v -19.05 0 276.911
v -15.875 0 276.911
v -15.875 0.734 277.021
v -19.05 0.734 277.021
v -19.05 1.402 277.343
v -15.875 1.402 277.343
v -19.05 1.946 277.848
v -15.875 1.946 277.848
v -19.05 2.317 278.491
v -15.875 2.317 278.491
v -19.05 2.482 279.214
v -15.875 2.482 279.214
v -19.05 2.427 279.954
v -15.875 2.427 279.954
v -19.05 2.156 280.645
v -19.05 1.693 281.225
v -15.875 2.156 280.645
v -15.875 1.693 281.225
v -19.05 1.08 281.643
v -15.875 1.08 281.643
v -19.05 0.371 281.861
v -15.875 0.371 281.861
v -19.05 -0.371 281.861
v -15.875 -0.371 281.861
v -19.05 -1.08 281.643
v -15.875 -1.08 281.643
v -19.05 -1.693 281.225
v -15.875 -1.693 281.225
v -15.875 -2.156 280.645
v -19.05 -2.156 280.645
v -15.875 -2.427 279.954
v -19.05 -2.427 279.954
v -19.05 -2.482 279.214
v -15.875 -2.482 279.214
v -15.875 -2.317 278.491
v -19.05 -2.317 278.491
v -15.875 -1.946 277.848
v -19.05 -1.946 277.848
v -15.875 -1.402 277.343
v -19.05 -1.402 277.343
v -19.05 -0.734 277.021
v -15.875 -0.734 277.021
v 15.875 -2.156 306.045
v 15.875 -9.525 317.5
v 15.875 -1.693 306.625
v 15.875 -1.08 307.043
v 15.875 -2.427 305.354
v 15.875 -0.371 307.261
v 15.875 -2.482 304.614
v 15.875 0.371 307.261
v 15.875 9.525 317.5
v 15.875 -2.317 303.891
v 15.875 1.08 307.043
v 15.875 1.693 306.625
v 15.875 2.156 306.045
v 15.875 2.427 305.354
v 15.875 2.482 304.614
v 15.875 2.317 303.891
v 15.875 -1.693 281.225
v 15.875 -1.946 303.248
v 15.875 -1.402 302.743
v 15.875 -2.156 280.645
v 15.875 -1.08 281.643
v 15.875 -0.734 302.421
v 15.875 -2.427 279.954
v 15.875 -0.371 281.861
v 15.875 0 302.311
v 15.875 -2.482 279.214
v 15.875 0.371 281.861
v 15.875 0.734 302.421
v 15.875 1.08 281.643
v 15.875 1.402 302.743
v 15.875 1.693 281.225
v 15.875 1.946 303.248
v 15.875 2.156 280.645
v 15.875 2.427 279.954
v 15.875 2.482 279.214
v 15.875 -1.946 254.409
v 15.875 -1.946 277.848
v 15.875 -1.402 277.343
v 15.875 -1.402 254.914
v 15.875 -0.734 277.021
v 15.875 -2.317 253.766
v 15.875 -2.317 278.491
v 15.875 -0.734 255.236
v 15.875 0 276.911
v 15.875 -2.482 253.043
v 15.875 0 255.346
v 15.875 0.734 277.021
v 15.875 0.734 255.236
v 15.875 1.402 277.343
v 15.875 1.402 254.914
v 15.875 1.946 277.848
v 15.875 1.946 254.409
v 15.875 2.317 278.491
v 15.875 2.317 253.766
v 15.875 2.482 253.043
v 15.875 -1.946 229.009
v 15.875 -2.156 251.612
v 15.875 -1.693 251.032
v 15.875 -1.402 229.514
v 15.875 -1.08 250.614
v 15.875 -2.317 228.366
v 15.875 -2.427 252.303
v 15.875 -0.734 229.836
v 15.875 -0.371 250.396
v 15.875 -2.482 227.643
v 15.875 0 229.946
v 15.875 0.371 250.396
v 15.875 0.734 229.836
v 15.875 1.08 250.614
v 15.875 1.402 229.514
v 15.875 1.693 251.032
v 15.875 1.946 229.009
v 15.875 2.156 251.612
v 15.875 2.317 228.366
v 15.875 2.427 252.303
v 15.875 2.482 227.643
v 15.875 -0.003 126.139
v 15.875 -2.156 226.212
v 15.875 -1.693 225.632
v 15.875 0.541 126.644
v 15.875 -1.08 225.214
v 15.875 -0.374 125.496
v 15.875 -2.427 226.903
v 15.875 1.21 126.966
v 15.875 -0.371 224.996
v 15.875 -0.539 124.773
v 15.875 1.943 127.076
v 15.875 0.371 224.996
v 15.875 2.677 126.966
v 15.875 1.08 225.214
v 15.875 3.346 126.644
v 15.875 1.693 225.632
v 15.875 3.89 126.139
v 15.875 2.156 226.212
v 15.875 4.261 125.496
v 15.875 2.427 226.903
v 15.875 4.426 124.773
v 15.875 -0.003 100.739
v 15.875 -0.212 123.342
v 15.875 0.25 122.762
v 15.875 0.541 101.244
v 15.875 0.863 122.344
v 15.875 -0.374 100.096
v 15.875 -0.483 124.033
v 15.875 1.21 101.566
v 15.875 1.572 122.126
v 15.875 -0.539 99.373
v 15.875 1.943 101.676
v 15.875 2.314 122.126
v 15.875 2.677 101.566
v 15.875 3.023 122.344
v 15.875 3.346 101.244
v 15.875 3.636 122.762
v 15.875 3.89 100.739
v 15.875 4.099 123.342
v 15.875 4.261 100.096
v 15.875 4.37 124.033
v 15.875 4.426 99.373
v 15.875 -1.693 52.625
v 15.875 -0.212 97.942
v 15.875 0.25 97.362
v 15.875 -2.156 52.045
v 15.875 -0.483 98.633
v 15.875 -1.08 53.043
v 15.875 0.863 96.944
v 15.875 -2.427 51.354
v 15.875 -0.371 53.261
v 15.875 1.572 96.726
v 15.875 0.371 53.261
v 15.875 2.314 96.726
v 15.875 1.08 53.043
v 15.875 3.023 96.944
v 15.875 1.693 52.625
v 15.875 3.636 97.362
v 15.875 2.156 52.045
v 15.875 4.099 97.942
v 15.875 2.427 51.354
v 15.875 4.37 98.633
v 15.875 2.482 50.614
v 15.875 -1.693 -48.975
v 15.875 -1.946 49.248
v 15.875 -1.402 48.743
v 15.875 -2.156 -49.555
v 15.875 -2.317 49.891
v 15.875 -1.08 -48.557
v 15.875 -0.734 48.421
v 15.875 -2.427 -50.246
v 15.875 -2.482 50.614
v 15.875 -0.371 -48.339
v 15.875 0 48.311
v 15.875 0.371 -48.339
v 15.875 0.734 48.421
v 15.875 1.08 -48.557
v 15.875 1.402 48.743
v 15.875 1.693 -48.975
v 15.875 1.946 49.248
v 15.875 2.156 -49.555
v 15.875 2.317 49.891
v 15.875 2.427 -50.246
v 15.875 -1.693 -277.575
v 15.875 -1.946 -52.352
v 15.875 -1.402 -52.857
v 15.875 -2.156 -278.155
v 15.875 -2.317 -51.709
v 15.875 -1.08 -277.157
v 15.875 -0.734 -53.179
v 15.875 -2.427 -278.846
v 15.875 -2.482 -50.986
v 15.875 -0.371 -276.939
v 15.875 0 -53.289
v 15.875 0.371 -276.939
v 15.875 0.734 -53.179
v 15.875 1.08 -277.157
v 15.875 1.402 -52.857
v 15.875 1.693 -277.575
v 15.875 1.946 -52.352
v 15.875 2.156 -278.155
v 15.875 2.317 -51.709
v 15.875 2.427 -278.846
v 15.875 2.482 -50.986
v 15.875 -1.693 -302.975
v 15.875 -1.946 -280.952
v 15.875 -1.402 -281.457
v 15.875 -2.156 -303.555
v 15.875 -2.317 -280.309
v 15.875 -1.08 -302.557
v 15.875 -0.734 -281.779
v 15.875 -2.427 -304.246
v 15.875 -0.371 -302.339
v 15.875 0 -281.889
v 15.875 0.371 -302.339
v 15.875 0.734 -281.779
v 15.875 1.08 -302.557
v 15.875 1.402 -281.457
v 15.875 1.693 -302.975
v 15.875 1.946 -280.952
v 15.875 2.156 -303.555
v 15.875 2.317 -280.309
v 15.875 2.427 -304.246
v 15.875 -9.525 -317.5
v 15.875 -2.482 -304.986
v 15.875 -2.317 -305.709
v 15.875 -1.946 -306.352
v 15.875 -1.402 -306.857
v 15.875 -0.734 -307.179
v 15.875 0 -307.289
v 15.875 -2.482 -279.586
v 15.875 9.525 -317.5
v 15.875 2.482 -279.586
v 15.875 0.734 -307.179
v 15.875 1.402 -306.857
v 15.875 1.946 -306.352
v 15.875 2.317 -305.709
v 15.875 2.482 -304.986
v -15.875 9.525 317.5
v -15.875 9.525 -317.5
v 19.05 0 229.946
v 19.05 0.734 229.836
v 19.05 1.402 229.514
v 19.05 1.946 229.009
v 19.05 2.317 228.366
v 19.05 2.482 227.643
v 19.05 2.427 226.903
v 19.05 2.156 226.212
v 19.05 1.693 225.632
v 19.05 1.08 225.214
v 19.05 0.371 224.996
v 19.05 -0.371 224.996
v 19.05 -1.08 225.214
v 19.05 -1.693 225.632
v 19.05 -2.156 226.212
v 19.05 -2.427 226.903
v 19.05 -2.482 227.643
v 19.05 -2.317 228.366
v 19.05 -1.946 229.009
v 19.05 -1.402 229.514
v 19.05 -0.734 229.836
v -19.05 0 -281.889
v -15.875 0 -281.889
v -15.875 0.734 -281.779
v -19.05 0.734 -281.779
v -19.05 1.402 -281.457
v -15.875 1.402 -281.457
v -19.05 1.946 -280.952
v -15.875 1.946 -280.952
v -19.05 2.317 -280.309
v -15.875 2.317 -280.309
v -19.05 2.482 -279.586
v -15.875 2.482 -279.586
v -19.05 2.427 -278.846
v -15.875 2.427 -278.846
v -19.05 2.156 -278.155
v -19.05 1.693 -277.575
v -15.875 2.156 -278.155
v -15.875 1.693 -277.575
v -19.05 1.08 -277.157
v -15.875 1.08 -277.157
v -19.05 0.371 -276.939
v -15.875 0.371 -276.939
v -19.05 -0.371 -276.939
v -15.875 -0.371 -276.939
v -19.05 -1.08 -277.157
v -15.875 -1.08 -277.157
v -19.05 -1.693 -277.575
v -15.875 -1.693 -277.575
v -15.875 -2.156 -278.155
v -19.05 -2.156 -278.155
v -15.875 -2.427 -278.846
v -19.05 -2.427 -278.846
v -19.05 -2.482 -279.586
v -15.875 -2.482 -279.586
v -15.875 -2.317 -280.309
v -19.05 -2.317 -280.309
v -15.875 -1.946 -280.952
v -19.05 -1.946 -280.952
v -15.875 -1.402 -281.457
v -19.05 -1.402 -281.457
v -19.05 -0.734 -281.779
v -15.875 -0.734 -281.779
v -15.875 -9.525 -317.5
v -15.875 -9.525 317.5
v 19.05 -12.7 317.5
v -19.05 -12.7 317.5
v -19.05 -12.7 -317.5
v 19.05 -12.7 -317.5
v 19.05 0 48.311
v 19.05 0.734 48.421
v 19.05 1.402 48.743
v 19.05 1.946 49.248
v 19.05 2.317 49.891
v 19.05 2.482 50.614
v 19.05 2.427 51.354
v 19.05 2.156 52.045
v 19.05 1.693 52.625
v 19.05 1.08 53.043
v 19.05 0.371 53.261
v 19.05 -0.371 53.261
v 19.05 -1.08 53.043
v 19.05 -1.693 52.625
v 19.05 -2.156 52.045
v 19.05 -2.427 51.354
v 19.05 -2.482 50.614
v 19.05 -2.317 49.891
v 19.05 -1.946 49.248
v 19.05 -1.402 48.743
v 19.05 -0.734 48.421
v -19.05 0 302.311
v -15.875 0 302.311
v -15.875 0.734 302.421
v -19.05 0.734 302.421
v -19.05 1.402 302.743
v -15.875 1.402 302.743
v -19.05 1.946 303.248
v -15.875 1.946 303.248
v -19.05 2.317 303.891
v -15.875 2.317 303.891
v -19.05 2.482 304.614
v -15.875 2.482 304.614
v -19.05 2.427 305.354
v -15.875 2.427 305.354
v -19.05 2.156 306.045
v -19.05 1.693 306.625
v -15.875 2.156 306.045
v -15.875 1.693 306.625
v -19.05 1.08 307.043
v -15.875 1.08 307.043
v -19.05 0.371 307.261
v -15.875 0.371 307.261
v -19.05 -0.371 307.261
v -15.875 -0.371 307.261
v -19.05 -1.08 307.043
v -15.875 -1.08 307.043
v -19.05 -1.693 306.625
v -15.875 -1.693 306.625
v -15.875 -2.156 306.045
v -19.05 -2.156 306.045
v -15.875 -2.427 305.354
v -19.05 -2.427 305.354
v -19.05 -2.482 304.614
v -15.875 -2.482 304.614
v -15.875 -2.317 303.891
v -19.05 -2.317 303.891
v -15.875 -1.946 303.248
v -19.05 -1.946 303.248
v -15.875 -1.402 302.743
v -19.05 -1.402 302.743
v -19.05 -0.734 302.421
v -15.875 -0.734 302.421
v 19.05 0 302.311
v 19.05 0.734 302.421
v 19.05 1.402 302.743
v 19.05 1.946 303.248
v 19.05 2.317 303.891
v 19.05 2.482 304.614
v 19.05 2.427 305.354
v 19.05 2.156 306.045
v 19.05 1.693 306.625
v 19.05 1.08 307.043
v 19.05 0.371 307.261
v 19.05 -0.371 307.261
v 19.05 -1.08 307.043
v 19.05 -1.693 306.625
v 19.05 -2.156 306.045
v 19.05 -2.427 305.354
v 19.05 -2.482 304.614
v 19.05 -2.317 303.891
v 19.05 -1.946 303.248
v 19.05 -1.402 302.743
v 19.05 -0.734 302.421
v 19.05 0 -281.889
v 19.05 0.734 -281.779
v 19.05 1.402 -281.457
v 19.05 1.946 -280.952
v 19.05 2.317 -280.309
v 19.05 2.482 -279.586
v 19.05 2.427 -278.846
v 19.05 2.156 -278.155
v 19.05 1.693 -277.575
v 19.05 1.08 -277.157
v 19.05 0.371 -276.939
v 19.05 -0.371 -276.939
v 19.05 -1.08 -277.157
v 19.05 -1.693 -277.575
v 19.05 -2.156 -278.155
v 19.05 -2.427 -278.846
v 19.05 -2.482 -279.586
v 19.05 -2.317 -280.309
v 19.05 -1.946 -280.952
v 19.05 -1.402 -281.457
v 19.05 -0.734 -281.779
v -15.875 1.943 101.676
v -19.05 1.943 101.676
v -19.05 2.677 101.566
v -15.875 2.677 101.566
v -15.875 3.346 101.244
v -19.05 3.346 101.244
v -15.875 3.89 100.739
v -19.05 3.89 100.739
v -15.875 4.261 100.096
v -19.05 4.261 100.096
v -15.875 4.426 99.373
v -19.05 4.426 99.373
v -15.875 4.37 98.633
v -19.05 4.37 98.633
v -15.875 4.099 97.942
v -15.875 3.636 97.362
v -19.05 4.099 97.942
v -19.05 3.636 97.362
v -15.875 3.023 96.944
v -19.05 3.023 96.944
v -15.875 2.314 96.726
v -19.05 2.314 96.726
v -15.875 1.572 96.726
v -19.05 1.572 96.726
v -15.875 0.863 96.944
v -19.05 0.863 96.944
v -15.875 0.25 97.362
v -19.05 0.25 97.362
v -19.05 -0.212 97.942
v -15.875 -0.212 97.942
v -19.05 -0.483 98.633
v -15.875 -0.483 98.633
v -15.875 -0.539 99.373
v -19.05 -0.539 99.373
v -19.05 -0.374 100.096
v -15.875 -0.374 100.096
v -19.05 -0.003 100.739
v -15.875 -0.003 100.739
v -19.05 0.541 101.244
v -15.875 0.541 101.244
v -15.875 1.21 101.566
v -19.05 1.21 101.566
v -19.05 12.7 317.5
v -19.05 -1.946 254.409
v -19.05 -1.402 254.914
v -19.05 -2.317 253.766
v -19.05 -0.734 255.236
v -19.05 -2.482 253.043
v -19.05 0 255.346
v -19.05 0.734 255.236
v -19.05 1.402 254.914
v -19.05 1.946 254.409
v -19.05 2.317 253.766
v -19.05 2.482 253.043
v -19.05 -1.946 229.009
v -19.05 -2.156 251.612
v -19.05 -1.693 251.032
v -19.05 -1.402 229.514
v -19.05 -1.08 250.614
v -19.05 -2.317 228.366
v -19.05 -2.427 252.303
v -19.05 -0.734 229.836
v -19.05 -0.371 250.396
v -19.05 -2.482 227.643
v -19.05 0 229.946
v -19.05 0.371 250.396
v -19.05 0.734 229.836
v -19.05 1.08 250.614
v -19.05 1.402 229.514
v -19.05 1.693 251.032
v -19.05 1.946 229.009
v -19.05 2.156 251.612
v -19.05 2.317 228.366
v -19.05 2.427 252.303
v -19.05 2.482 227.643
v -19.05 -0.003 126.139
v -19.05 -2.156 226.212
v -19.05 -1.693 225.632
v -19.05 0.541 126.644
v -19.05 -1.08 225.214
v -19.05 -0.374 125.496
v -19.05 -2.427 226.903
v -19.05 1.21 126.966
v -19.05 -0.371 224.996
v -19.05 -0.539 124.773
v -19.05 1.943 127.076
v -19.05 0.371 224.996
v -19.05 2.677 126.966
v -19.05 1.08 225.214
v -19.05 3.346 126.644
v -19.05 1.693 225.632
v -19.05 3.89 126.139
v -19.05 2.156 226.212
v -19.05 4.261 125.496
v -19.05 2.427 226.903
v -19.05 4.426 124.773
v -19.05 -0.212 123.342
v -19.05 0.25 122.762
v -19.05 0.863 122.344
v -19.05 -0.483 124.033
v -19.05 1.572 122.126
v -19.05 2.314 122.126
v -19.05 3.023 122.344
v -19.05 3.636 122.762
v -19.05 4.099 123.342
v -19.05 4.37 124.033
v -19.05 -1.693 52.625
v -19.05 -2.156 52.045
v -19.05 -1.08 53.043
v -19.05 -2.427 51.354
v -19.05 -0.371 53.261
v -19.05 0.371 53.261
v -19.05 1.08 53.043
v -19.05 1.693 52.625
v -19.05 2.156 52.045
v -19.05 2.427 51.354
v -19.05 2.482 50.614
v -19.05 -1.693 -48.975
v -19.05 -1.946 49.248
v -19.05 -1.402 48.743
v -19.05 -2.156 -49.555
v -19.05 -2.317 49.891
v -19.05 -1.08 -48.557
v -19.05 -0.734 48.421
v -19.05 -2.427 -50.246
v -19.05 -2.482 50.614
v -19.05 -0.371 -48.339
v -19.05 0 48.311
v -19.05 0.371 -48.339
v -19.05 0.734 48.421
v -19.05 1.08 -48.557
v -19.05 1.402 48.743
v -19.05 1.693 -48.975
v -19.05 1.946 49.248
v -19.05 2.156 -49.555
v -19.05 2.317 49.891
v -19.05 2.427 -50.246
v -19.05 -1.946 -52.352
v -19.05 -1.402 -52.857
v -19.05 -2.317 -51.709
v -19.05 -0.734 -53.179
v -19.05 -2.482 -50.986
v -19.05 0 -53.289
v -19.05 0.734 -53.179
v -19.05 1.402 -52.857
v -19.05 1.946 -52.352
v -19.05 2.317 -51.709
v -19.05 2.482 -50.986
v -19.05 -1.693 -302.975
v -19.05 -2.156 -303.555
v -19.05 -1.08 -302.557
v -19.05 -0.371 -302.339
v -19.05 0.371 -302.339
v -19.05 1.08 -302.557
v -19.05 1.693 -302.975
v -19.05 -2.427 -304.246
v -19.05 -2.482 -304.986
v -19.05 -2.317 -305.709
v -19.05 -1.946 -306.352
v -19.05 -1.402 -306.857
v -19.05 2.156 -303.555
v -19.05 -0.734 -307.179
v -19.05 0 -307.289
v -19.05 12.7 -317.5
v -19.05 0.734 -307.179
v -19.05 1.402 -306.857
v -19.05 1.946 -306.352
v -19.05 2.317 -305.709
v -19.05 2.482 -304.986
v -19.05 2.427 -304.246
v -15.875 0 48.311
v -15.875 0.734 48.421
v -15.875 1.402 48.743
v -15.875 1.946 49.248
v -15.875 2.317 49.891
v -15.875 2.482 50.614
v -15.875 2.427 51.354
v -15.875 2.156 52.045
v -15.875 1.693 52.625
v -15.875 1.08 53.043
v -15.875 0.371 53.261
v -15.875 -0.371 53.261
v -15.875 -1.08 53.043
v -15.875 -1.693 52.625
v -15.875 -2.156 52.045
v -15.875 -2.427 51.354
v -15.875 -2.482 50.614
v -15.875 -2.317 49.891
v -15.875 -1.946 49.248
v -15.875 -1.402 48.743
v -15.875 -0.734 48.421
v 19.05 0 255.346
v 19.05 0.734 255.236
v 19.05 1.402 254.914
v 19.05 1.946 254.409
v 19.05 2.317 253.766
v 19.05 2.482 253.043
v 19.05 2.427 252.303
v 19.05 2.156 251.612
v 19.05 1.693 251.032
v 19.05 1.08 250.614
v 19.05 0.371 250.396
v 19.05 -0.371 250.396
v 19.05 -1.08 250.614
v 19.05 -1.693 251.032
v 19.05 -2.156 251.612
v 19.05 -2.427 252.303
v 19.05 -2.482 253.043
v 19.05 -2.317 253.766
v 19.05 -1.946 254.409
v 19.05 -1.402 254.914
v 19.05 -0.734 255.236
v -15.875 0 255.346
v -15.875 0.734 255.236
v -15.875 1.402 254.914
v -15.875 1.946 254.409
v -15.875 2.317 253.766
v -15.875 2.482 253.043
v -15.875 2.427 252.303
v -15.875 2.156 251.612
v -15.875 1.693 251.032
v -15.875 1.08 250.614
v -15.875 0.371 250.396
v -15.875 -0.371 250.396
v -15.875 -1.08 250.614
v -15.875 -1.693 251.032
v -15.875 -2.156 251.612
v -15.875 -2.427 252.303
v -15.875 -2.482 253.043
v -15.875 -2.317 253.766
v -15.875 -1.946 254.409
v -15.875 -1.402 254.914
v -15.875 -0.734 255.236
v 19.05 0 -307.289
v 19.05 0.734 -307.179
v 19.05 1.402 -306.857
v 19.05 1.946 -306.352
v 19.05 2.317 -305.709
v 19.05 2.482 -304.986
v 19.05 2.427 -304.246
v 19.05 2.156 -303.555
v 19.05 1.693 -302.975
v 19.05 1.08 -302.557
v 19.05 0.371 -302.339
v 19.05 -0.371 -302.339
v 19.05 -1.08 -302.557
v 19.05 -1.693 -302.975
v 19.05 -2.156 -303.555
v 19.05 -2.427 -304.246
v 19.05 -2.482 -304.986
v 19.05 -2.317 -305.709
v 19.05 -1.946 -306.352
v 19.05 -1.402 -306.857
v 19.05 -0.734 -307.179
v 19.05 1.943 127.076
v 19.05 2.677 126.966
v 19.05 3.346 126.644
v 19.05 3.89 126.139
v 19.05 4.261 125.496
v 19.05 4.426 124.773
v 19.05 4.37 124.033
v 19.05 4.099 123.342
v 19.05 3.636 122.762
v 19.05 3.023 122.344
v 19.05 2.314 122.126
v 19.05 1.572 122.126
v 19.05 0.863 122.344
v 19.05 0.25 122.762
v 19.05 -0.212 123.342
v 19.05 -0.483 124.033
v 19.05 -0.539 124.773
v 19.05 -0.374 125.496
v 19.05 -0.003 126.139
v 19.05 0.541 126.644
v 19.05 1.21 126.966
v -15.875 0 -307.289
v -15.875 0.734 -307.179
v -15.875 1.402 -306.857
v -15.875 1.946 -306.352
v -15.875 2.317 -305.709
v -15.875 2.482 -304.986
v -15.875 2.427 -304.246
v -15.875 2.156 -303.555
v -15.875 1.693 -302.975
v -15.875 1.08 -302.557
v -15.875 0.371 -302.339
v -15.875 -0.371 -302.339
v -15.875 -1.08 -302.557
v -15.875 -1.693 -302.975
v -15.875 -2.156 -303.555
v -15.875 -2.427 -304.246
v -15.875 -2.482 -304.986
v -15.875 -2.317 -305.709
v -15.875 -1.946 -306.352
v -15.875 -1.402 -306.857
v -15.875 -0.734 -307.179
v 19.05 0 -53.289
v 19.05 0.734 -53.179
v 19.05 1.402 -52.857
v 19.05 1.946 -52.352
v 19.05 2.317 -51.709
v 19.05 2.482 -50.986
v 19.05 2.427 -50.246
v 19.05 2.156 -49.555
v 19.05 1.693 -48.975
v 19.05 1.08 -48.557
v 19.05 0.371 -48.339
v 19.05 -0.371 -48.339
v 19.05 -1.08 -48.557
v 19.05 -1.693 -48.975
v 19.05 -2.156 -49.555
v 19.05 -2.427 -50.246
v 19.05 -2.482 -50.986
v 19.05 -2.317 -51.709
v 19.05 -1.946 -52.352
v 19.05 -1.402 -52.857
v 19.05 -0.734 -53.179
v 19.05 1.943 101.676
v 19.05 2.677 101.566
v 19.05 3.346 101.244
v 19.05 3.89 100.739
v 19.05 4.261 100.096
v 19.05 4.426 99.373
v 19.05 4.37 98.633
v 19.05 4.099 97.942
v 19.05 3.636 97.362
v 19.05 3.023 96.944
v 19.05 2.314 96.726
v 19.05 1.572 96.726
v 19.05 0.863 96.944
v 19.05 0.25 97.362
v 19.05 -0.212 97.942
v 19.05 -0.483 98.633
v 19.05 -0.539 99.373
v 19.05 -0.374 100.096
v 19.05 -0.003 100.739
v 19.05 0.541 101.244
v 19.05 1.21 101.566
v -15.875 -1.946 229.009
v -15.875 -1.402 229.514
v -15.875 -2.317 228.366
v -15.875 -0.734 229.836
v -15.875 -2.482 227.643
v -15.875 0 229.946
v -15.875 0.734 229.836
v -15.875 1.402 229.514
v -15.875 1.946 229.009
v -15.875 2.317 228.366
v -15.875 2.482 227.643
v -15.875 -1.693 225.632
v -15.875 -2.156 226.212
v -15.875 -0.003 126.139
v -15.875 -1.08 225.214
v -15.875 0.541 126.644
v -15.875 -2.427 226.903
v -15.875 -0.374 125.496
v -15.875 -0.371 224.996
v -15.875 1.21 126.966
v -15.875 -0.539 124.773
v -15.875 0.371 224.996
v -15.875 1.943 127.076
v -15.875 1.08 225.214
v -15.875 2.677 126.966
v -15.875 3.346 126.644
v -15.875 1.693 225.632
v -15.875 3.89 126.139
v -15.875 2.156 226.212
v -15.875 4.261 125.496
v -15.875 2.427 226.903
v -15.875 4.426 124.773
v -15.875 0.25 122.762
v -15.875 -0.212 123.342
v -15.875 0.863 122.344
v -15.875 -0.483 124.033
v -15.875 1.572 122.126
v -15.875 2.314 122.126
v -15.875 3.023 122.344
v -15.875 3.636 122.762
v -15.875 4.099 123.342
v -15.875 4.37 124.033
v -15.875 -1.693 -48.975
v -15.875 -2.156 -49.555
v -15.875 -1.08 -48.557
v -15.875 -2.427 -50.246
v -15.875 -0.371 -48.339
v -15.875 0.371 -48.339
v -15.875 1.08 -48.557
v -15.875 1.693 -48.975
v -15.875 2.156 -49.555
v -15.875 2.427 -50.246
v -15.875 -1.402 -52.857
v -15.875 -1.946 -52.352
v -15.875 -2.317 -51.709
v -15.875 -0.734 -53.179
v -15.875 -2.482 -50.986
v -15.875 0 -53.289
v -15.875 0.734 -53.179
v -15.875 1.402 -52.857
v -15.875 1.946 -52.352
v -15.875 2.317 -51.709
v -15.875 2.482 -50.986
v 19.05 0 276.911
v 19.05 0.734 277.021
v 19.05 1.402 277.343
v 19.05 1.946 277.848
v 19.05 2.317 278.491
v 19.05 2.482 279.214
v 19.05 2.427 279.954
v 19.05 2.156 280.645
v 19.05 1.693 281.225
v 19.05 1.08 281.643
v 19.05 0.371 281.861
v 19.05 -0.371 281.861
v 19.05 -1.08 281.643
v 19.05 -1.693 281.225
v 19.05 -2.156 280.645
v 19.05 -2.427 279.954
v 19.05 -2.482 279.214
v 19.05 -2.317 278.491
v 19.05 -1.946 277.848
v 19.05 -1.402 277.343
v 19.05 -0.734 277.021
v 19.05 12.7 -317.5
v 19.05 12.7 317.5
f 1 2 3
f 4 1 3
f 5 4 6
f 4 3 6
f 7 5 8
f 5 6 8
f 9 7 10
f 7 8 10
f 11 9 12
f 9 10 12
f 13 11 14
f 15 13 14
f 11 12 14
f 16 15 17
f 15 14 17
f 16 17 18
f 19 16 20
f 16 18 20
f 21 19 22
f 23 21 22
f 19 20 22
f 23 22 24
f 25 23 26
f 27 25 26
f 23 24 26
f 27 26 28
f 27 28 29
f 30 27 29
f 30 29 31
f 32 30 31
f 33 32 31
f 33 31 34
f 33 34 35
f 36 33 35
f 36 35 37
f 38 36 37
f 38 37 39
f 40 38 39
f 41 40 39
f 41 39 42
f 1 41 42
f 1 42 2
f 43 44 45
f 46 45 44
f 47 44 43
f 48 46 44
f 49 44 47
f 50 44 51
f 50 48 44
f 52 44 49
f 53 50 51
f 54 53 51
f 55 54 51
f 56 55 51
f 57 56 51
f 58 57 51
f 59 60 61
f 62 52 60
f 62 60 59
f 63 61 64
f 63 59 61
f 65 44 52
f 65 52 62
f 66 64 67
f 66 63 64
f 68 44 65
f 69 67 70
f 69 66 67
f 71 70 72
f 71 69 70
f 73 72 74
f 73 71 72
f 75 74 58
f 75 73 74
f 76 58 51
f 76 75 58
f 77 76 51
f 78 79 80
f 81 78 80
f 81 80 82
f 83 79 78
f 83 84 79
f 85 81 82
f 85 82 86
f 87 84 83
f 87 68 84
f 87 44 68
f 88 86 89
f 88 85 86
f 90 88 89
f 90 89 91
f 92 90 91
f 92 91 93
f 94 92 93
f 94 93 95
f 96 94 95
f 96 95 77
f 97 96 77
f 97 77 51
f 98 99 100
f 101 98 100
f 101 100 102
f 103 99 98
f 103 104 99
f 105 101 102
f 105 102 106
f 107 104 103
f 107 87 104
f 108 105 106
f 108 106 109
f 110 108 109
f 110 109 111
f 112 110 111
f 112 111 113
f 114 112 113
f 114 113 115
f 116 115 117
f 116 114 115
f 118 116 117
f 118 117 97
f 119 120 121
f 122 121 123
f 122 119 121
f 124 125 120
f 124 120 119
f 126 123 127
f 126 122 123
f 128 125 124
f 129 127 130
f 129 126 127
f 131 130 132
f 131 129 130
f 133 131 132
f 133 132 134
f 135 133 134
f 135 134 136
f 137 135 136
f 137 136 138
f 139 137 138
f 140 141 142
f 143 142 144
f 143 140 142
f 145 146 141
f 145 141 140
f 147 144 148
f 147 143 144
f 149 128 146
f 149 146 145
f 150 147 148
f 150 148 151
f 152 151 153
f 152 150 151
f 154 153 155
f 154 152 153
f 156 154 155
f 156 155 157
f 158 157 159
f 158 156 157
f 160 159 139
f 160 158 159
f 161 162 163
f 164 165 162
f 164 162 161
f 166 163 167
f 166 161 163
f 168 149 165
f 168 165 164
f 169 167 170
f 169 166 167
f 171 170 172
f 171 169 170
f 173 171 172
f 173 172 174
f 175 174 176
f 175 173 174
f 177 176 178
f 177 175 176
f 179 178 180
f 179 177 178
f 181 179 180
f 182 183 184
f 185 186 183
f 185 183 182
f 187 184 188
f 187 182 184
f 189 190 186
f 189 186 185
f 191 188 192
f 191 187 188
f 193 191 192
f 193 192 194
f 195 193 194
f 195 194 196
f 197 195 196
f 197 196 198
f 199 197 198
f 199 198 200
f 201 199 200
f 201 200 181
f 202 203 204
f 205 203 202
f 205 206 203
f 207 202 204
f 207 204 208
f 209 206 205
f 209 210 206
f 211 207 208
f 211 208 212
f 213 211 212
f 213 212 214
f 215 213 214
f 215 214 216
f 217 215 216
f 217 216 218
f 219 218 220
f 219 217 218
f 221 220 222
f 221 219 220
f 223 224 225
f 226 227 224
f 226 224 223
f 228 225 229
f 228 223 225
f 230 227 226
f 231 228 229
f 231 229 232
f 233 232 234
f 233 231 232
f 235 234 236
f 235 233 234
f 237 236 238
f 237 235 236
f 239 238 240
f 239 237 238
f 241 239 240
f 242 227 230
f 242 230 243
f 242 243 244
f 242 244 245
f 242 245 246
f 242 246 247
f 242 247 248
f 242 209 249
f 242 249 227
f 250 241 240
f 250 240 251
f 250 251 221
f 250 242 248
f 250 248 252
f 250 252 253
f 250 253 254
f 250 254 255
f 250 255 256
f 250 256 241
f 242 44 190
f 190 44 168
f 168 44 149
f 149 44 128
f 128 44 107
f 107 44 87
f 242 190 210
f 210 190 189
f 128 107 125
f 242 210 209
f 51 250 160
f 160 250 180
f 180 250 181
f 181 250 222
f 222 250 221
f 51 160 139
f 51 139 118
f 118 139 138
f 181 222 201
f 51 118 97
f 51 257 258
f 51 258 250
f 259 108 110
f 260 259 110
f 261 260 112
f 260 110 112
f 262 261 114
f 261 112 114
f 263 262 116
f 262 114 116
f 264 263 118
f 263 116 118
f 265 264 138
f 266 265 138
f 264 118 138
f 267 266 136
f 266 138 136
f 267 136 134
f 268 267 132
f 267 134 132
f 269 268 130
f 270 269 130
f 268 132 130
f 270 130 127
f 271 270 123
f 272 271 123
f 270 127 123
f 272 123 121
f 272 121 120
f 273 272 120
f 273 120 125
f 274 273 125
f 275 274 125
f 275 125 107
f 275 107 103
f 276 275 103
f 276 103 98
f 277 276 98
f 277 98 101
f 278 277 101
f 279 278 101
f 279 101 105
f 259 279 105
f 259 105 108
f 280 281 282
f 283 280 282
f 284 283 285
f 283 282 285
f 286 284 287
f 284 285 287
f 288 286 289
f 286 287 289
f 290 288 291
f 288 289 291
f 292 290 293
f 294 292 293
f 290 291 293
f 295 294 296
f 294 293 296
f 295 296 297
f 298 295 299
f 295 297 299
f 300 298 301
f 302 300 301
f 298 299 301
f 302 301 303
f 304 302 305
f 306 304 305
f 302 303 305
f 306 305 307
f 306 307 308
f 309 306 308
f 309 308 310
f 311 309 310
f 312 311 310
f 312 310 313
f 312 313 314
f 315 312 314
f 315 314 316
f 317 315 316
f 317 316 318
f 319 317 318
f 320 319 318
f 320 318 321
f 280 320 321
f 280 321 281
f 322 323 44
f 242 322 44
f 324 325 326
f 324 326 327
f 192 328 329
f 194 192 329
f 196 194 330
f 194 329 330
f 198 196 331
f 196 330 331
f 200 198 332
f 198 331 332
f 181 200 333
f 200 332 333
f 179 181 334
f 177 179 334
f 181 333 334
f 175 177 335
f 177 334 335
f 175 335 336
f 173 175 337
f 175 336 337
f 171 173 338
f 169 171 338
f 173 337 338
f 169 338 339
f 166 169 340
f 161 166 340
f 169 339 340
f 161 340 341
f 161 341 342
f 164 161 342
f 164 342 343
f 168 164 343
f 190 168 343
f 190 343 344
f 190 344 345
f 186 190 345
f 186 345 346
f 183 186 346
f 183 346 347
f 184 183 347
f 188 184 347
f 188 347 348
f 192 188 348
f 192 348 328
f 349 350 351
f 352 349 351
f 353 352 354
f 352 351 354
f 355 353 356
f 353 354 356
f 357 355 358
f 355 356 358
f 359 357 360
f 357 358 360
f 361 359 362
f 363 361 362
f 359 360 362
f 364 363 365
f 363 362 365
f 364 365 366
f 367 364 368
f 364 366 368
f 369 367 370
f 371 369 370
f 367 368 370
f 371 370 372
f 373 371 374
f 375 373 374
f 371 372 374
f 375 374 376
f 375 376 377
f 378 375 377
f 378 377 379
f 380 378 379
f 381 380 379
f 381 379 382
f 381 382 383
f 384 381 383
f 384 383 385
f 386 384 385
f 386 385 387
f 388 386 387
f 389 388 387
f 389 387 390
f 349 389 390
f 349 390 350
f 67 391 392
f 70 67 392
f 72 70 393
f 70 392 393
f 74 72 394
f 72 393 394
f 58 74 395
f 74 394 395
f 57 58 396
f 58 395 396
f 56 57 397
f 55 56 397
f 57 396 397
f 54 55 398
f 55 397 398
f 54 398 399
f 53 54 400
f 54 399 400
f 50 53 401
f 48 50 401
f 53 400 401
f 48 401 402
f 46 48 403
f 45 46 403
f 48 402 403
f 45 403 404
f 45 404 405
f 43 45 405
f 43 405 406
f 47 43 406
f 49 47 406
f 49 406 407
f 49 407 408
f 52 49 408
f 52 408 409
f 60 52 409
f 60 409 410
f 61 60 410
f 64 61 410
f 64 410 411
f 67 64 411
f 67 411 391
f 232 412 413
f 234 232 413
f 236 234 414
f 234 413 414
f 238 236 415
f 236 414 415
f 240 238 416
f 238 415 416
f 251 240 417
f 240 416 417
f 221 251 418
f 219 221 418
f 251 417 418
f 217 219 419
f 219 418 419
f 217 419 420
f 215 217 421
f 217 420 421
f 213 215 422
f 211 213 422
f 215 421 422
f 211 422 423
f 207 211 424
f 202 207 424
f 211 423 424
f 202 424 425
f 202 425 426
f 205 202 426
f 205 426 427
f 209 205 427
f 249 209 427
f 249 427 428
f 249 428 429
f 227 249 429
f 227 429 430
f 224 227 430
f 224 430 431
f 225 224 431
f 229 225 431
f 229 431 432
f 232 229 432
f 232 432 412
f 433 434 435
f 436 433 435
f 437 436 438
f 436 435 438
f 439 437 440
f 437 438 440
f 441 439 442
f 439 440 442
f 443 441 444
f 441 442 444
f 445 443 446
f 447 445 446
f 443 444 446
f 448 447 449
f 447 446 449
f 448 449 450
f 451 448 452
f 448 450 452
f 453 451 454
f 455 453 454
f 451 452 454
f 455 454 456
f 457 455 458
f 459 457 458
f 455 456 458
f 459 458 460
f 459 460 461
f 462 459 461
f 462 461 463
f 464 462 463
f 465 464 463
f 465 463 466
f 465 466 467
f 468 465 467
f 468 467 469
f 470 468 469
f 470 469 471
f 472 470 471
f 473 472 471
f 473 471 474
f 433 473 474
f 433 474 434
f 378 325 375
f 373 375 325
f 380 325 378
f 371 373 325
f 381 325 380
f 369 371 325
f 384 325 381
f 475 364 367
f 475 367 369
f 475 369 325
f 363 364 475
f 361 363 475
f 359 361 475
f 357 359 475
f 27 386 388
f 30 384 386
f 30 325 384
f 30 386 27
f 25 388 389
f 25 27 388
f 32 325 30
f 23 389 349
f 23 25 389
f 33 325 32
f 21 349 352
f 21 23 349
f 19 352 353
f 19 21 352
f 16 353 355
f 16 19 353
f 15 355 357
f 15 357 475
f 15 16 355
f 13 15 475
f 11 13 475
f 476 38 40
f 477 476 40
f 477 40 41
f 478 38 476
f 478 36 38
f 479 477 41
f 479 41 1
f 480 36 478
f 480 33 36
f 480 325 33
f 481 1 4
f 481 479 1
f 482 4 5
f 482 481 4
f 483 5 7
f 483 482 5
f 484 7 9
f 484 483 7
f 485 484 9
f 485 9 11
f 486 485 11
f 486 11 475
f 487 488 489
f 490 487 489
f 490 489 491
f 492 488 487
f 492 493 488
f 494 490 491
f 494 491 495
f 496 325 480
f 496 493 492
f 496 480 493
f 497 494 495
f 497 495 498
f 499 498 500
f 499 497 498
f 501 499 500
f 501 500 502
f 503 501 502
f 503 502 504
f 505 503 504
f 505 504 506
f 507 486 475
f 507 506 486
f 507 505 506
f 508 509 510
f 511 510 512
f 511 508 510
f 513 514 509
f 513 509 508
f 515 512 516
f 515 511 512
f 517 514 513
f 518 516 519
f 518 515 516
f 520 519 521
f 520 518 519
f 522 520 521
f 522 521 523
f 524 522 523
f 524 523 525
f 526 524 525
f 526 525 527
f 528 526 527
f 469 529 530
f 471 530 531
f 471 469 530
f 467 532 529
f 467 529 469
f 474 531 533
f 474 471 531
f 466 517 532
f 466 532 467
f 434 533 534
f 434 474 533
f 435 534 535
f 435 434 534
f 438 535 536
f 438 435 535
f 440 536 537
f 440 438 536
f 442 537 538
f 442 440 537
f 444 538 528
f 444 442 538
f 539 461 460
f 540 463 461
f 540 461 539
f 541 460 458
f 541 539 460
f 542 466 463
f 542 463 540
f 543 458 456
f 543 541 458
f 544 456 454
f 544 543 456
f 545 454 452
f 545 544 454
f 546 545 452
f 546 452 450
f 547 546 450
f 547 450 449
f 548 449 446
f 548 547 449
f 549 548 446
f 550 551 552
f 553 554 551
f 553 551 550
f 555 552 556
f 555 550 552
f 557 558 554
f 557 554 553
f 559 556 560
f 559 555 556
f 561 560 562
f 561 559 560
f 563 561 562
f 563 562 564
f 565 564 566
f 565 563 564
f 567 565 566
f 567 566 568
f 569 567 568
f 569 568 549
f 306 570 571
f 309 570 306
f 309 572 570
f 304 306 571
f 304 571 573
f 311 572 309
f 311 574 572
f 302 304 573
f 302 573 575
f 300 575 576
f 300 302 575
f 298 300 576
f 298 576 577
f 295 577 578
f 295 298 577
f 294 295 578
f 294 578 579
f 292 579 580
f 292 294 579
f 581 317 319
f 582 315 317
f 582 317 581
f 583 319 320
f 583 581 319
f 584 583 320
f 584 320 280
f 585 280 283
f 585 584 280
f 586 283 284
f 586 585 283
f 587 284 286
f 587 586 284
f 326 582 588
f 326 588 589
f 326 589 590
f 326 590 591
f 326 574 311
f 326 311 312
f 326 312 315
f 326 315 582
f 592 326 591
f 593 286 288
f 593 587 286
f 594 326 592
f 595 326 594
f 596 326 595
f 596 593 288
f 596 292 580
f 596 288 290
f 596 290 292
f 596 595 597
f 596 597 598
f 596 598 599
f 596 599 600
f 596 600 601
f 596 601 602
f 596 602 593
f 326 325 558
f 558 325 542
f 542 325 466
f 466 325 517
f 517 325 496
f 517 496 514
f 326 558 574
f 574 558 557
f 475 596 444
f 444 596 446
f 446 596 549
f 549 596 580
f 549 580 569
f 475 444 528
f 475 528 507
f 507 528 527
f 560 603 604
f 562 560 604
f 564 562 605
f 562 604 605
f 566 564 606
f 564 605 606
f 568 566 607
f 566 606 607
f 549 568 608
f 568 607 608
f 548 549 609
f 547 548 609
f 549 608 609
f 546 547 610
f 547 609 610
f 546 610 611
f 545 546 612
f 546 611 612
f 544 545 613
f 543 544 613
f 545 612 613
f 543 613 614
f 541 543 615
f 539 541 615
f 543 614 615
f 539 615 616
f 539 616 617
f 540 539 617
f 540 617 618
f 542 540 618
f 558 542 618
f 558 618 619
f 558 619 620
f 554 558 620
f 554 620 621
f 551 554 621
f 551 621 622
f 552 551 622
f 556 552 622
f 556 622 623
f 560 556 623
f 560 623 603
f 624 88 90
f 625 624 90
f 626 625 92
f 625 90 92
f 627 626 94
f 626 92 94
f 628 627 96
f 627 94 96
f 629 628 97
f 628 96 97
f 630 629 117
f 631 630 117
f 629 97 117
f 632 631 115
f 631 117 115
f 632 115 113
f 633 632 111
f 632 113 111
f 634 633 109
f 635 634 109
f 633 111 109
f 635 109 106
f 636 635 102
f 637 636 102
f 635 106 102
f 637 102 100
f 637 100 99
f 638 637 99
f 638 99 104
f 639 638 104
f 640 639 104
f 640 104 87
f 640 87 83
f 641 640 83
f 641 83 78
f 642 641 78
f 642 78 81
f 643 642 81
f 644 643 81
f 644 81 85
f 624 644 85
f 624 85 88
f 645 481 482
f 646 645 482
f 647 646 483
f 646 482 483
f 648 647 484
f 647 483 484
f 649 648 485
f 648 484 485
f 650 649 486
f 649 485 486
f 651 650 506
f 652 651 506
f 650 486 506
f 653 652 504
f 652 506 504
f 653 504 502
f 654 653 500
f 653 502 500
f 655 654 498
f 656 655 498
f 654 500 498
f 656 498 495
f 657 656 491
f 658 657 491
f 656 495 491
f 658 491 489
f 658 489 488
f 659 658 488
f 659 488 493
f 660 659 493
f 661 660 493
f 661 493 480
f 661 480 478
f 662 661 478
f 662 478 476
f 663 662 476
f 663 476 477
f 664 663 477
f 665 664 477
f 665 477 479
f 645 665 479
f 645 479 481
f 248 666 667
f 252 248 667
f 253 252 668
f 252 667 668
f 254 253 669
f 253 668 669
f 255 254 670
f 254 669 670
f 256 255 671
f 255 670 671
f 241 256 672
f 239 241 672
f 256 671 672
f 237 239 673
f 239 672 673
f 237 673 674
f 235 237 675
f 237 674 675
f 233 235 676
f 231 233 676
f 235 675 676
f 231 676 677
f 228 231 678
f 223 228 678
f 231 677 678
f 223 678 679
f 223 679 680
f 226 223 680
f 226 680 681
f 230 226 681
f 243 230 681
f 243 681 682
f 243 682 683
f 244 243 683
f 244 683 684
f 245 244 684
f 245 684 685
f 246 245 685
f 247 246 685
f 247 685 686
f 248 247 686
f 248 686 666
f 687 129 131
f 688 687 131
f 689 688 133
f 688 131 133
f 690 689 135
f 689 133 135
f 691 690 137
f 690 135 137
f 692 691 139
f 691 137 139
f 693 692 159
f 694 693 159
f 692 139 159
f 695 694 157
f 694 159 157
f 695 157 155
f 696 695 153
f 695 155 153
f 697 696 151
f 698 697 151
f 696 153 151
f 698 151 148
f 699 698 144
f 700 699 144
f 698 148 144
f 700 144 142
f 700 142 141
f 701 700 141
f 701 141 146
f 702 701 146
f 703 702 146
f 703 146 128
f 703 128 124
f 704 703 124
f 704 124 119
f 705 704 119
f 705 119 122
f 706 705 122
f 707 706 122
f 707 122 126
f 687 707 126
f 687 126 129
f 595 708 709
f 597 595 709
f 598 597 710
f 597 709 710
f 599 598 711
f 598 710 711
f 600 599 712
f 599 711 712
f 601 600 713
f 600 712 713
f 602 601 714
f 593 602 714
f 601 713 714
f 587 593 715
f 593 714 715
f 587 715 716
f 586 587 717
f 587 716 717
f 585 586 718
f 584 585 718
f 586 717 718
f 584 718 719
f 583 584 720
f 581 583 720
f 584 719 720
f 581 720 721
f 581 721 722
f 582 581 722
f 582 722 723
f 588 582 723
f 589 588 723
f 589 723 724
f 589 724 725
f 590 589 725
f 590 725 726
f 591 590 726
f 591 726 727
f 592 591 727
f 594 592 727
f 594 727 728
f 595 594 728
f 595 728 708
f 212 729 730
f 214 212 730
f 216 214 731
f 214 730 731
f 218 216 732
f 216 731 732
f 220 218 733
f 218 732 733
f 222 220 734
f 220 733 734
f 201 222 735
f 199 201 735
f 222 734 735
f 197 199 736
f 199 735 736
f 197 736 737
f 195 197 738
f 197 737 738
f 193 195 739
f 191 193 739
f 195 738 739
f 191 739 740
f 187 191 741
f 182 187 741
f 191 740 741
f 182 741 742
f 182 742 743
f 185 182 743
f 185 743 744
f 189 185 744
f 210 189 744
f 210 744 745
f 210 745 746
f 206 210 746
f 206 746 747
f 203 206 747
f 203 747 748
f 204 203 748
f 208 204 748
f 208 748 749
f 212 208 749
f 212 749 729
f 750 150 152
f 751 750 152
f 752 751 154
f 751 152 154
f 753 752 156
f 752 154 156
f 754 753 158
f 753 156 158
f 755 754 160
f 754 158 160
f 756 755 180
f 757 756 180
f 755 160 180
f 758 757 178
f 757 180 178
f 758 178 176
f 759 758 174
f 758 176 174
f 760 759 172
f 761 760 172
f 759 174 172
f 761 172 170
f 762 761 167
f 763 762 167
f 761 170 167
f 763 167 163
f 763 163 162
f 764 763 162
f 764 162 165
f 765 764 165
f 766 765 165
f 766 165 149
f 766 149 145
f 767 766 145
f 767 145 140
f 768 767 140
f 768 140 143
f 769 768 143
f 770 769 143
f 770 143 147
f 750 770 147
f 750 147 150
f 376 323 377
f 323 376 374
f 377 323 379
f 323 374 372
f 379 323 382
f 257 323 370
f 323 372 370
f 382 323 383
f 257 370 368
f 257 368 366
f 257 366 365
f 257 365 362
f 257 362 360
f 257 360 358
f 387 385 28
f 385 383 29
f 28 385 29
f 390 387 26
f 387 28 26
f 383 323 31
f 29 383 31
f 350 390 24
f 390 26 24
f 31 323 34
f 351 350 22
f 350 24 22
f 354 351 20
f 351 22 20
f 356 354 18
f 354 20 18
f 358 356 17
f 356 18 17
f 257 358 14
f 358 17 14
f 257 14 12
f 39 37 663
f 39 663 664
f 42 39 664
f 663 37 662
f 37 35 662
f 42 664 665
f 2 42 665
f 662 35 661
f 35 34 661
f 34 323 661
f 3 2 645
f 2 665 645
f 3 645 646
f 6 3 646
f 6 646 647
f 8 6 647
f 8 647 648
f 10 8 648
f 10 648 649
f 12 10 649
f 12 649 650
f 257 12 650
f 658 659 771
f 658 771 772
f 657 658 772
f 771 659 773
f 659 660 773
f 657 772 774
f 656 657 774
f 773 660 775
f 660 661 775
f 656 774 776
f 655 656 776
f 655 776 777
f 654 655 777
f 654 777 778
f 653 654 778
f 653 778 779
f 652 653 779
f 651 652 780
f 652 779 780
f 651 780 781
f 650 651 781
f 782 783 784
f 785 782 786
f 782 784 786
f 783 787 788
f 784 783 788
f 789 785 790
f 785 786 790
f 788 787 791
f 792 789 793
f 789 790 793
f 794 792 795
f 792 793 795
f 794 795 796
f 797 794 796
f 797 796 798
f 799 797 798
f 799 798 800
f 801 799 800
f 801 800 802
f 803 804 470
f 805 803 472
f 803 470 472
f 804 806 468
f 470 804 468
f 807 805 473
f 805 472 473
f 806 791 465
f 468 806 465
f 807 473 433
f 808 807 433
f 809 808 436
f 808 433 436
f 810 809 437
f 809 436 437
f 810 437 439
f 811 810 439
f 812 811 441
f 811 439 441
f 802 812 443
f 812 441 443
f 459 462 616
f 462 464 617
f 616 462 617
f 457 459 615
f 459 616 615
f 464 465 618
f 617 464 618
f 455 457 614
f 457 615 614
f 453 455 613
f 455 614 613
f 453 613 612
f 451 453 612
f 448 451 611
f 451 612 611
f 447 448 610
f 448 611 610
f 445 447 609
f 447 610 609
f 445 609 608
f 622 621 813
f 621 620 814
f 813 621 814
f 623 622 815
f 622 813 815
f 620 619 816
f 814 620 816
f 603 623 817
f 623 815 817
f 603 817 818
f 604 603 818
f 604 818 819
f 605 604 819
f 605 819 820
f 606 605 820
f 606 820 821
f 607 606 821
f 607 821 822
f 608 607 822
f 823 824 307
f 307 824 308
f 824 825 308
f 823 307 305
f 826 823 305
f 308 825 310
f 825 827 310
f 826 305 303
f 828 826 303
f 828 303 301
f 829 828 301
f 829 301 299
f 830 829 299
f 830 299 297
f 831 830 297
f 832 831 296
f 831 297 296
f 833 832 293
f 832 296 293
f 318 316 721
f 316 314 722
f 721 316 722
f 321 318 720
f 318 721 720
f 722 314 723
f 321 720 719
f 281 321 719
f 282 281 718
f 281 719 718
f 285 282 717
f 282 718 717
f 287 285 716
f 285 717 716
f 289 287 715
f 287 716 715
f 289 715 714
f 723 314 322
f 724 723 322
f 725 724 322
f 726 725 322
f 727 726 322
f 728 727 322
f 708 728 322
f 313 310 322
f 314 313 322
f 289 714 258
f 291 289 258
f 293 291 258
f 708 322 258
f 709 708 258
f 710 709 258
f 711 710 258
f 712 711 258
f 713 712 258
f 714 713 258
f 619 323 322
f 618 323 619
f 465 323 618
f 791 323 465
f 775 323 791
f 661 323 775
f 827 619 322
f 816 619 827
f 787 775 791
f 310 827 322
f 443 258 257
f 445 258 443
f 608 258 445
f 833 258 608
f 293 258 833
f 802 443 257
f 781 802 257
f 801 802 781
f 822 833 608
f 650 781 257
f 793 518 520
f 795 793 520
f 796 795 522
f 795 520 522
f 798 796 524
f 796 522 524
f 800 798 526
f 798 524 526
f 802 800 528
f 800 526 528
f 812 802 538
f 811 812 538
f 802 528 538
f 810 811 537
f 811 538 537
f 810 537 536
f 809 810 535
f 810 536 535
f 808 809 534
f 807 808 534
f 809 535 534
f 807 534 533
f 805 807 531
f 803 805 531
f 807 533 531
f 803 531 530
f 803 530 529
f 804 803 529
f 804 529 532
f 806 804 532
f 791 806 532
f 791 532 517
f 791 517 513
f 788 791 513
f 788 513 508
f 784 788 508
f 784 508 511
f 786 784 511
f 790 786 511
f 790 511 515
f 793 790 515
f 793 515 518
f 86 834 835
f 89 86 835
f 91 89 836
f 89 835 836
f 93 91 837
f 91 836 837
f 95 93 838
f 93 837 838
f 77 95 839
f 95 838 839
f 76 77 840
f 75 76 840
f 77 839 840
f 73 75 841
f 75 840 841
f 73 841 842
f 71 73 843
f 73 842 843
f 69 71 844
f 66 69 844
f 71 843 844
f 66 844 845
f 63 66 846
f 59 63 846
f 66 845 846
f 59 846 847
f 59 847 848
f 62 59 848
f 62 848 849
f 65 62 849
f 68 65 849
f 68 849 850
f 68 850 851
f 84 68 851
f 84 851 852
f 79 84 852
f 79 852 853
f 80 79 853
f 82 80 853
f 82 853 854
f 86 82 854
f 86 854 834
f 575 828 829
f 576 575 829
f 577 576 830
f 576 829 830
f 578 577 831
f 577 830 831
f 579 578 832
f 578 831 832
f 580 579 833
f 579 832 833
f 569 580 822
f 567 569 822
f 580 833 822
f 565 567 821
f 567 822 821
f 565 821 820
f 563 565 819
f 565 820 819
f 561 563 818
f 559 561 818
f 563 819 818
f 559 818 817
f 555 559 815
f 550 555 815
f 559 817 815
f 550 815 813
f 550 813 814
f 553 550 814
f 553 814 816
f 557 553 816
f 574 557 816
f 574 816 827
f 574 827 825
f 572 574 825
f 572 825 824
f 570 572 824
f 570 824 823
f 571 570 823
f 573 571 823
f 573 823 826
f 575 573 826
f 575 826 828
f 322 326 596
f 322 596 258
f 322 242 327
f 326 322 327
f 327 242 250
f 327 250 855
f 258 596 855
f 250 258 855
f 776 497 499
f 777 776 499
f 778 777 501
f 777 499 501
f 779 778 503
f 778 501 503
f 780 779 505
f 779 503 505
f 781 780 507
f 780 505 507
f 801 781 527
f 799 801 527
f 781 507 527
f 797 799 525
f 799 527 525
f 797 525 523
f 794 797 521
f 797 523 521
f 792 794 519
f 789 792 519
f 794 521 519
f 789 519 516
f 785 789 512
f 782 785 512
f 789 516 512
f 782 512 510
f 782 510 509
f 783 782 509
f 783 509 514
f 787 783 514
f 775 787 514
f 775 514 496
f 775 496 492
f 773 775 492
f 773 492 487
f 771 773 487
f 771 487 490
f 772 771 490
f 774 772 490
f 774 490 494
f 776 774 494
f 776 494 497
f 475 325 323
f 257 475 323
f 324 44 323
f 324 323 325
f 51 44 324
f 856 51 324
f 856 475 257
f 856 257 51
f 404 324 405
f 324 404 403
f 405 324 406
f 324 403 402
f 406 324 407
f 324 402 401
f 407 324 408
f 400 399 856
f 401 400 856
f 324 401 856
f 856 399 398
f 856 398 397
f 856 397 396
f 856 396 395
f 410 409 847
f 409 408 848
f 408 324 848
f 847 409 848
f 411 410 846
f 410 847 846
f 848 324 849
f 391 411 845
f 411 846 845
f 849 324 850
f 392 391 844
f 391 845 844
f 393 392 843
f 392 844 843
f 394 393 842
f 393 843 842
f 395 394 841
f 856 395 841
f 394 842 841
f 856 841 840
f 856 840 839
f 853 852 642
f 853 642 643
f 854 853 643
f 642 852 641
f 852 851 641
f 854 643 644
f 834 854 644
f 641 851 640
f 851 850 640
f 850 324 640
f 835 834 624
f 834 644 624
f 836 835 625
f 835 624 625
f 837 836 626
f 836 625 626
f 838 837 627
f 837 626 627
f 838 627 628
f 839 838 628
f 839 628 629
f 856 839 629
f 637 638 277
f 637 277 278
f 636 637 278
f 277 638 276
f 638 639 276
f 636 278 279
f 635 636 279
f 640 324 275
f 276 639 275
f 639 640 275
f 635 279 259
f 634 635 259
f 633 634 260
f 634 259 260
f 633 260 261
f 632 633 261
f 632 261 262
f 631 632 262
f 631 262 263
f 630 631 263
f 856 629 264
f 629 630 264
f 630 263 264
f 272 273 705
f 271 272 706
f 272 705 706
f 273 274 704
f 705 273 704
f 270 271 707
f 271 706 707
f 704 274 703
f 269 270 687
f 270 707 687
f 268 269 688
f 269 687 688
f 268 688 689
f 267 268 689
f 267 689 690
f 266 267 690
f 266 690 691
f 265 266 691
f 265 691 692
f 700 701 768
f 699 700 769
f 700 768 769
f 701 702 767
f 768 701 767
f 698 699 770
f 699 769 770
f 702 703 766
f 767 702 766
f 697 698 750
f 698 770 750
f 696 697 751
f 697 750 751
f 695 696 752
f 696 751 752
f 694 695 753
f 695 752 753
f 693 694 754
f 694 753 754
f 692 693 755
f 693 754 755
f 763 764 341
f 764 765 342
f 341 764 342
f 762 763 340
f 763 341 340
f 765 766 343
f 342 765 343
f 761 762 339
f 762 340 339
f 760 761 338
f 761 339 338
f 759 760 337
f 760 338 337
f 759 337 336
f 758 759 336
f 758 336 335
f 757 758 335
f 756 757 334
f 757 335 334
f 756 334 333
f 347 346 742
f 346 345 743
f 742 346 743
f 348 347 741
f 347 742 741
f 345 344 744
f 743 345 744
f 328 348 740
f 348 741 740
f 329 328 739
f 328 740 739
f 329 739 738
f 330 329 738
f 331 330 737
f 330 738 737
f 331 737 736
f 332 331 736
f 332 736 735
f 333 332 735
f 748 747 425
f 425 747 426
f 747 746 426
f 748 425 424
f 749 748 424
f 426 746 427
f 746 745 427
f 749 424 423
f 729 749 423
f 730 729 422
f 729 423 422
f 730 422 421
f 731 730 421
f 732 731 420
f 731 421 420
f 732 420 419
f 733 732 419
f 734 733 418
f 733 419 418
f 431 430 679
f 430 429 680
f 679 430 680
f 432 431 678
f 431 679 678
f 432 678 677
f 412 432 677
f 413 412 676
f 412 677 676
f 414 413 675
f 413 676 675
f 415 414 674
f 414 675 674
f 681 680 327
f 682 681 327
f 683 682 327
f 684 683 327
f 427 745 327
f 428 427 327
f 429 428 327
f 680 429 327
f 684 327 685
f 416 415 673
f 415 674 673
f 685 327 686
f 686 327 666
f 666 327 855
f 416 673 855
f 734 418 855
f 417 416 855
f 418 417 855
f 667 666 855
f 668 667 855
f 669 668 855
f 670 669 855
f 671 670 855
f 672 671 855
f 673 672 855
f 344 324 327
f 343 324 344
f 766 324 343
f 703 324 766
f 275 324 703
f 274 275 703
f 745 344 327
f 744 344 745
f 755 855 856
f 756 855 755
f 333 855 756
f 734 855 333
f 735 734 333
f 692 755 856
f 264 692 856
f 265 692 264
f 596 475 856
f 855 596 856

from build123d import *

# Parameters (mm, degrees)
BOSS_EXTRUDE1_DEPTH      = 317.499999
BOSS_EXTRUDE1_DEPTH_BACK = 317.499999
SKETCH3_W                = 38.1
SKETCH3_H                = 25.4
SKETCH3_W_2              = 31.75
SKETCH3_H_2              = 19.05
F_10_CLEARANCE_HOLE2_D   = 4.9784
F_10_CLEARANCE_HOLE4_D   = 4.9784
F_10_CLEARANCE_HOLE3_D   = 4.9784


with BuildPart() as part:
    # Sketch3 → Boss-Extrude1 (new, two sides: drawn at the far end of the back side and taken through both)
    with BuildSketch(Plane.XY.offset(-BOSS_EXTRUDE1_DEPTH_BACK)):
        Rectangle(SKETCH3_W, SKETCH3_H)
        Rectangle(SKETCH3_W_2, SKETCH3_H_2, mode=Mode.SUBTRACT)
    extrude(amount=BOSS_EXTRUDE1_DEPTH + BOSS_EXTRUDE1_DEPTH_BACK)

    # #10 Clearance Hole2 (through all)
    with Locations(Plane.ZY.offset(19.05)):
        with Locations((-304.800000508, 0), (-279.400000508, 0), (279.399999492, 0), (304.799999492, 0)):
            Hole(F_10_CLEARANCE_HOLE2_D / 2)

    # #10 Clearance Hole4 (through all)
    with Locations(Plane(origin=(19.05, 0, 0), x_dir=(0, 0, -1), z_dir=(1, 0, 0))):
        with Locations((-252.857000506, 8e-09), (-227.457000506, 1.1e-08), (-124.587000507, 1.943404818), (-99.187000507, 1.943404821)):
            Hole(F_10_CLEARANCE_HOLE4_D / 2)

    # #10 Clearance Hole3 (through all)
    with Locations(Plane.ZY.offset(19.05)):
        with Locations((-50.8, 0), (50.8, 0)):
            Hole(F_10_CLEARANCE_HOLE3_D / 2)


solid = part.part
